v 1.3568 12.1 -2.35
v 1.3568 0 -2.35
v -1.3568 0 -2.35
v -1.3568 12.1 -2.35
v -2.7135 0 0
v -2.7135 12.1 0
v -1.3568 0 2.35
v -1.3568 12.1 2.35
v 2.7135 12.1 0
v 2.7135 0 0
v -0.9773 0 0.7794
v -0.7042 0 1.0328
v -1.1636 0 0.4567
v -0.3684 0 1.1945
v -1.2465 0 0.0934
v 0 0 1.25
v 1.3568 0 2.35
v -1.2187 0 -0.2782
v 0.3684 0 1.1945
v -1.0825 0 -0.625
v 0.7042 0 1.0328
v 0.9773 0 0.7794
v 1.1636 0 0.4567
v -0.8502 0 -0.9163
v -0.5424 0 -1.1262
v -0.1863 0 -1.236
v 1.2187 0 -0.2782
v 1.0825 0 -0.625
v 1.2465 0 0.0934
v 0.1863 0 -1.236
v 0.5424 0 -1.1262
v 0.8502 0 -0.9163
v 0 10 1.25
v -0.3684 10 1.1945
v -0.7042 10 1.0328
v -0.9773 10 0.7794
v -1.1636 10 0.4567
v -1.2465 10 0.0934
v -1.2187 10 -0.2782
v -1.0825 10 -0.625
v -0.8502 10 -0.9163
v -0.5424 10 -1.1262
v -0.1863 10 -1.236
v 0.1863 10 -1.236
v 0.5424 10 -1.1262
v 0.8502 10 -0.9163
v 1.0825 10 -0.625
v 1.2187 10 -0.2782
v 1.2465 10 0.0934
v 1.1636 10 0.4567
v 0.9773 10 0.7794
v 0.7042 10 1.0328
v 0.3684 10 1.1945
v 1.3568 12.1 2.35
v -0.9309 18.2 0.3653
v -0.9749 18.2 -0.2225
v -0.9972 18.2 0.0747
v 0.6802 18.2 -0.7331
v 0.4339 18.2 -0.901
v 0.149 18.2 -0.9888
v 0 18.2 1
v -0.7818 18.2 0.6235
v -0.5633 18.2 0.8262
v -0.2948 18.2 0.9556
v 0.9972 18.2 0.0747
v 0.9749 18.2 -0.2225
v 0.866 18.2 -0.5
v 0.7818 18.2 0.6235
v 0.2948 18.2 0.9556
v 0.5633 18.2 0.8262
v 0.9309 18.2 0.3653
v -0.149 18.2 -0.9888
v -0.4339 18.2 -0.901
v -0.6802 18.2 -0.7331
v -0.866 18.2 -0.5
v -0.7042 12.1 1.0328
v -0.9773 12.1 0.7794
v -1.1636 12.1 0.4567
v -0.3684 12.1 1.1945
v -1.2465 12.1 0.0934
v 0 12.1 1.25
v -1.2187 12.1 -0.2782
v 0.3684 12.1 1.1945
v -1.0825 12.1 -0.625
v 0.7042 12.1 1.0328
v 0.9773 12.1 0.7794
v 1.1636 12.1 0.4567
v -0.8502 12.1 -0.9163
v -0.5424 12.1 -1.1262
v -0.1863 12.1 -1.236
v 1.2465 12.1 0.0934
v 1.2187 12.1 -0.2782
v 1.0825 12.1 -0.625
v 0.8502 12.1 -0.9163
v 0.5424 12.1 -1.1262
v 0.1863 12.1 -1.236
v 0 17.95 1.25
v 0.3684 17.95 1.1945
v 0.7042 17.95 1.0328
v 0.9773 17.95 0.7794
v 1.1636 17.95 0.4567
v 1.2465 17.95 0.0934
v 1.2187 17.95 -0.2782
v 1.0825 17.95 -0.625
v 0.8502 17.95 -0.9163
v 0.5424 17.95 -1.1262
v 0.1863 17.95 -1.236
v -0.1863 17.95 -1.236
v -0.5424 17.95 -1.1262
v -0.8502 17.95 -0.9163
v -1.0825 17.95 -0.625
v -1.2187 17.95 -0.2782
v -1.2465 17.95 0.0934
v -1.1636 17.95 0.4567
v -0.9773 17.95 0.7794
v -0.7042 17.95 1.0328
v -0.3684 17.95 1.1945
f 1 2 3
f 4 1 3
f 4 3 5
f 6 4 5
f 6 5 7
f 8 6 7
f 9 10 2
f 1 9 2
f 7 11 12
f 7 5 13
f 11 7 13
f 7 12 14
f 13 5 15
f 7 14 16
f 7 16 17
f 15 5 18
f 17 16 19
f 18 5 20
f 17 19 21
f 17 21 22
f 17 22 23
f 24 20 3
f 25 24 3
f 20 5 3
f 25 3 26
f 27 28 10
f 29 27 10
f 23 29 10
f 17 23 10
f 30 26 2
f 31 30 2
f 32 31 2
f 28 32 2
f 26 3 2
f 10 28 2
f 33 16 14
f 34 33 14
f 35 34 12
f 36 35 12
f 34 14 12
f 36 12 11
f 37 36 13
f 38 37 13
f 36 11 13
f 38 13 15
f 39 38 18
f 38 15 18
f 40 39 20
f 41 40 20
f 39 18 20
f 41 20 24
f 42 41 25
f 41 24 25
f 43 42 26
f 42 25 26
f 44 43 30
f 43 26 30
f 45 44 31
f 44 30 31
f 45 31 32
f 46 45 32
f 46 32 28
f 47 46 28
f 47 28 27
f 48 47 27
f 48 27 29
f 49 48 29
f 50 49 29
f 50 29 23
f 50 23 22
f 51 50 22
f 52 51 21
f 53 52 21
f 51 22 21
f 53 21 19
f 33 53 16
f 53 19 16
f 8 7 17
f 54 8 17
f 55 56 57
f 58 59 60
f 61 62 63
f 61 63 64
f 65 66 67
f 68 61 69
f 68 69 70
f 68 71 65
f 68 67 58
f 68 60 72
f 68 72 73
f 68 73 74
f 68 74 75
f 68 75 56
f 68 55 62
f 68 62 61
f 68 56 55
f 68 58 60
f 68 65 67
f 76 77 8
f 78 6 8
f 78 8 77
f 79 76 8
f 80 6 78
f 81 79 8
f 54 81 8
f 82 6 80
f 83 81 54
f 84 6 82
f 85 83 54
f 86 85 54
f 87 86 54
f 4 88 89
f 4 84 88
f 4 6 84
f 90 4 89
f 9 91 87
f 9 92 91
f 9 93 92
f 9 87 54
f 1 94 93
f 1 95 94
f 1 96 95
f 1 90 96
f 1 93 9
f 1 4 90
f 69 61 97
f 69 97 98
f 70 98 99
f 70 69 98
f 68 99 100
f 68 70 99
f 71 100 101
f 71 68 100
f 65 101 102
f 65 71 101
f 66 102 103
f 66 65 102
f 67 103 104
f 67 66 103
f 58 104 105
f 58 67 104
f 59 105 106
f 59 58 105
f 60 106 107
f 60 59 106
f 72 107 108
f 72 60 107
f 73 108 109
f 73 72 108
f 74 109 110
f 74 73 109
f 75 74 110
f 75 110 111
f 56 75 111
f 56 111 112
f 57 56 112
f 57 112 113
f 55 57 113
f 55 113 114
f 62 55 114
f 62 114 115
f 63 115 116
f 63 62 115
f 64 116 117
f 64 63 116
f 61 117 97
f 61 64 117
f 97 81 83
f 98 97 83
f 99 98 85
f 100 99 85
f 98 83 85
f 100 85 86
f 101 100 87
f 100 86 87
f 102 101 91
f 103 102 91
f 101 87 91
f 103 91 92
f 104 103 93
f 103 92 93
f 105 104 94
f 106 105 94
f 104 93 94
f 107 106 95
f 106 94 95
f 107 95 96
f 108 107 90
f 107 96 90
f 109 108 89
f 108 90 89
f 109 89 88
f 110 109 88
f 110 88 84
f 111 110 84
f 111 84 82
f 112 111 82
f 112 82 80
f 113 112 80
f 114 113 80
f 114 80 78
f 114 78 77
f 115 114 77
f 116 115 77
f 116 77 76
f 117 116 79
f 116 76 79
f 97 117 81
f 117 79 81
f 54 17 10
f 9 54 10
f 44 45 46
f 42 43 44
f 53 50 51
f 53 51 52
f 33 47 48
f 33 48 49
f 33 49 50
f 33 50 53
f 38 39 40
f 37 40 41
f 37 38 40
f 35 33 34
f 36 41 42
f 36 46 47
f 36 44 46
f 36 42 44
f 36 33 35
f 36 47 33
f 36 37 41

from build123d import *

# Parameters (mm, degrees)
BOSS_EXTRUDE1_DEPTH = 12.1
SKETCH2_R           = 1.25
BOSS_EXTRUDE2_DEPTH = 6.1
CHAMFER1_SIZE       = 0.25
SKETCH3_R           = 1.25
CUT_EXTRUDE1_DEPTH  = 10


with BuildPart() as part:
    # Sketch1 → Boss-Extrude1 (new body)
    with BuildSketch(Plane(origin=(0, 0, 0), x_dir=(1, 0, 0), z_dir=(0, 1, 0))):
        Polygon((2.713546265, 0), (1.356773133, 2.35), (-1.356773133, 2.35), (-2.713546265, 0), (-1.356773133, -2.35), (1.356773133, -2.35), align=None)
    extrude(amount=BOSS_EXTRUDE1_DEPTH)

    # Sketch2 → Boss-Extrude2 (add)
    with BuildSketch(Plane(origin=(0, 12.1, 0), x_dir=(1, 0, 0), z_dir=(0, 1, 0))):
        with Locations(Location((0, 0, 0), (0, 0, 270))):
            Circle(SKETCH2_R)
    extrude(amount=BOSS_EXTRUDE2_DEPTH)

    # Chamfer1
    chamfer1_edges = [part.edges().sort_by_distance(p)[0] for p in [
        (0, 18.2, -1.25),
    ]]
    chamfer(chamfer1_edges, length=CHAMFER1_SIZE)

    # Sketch3 → Cut-Extrude1 (cut)
    with BuildSketch(Plane.XZ):
        with Locations(Location((0, 0, 0), (0, 0, 90))):
            Circle(SKETCH3_R)
    extrude(amount=-CUT_EXTRUDE1_DEPTH, mode=Mode.SUBTRACT)


solid = part.part
